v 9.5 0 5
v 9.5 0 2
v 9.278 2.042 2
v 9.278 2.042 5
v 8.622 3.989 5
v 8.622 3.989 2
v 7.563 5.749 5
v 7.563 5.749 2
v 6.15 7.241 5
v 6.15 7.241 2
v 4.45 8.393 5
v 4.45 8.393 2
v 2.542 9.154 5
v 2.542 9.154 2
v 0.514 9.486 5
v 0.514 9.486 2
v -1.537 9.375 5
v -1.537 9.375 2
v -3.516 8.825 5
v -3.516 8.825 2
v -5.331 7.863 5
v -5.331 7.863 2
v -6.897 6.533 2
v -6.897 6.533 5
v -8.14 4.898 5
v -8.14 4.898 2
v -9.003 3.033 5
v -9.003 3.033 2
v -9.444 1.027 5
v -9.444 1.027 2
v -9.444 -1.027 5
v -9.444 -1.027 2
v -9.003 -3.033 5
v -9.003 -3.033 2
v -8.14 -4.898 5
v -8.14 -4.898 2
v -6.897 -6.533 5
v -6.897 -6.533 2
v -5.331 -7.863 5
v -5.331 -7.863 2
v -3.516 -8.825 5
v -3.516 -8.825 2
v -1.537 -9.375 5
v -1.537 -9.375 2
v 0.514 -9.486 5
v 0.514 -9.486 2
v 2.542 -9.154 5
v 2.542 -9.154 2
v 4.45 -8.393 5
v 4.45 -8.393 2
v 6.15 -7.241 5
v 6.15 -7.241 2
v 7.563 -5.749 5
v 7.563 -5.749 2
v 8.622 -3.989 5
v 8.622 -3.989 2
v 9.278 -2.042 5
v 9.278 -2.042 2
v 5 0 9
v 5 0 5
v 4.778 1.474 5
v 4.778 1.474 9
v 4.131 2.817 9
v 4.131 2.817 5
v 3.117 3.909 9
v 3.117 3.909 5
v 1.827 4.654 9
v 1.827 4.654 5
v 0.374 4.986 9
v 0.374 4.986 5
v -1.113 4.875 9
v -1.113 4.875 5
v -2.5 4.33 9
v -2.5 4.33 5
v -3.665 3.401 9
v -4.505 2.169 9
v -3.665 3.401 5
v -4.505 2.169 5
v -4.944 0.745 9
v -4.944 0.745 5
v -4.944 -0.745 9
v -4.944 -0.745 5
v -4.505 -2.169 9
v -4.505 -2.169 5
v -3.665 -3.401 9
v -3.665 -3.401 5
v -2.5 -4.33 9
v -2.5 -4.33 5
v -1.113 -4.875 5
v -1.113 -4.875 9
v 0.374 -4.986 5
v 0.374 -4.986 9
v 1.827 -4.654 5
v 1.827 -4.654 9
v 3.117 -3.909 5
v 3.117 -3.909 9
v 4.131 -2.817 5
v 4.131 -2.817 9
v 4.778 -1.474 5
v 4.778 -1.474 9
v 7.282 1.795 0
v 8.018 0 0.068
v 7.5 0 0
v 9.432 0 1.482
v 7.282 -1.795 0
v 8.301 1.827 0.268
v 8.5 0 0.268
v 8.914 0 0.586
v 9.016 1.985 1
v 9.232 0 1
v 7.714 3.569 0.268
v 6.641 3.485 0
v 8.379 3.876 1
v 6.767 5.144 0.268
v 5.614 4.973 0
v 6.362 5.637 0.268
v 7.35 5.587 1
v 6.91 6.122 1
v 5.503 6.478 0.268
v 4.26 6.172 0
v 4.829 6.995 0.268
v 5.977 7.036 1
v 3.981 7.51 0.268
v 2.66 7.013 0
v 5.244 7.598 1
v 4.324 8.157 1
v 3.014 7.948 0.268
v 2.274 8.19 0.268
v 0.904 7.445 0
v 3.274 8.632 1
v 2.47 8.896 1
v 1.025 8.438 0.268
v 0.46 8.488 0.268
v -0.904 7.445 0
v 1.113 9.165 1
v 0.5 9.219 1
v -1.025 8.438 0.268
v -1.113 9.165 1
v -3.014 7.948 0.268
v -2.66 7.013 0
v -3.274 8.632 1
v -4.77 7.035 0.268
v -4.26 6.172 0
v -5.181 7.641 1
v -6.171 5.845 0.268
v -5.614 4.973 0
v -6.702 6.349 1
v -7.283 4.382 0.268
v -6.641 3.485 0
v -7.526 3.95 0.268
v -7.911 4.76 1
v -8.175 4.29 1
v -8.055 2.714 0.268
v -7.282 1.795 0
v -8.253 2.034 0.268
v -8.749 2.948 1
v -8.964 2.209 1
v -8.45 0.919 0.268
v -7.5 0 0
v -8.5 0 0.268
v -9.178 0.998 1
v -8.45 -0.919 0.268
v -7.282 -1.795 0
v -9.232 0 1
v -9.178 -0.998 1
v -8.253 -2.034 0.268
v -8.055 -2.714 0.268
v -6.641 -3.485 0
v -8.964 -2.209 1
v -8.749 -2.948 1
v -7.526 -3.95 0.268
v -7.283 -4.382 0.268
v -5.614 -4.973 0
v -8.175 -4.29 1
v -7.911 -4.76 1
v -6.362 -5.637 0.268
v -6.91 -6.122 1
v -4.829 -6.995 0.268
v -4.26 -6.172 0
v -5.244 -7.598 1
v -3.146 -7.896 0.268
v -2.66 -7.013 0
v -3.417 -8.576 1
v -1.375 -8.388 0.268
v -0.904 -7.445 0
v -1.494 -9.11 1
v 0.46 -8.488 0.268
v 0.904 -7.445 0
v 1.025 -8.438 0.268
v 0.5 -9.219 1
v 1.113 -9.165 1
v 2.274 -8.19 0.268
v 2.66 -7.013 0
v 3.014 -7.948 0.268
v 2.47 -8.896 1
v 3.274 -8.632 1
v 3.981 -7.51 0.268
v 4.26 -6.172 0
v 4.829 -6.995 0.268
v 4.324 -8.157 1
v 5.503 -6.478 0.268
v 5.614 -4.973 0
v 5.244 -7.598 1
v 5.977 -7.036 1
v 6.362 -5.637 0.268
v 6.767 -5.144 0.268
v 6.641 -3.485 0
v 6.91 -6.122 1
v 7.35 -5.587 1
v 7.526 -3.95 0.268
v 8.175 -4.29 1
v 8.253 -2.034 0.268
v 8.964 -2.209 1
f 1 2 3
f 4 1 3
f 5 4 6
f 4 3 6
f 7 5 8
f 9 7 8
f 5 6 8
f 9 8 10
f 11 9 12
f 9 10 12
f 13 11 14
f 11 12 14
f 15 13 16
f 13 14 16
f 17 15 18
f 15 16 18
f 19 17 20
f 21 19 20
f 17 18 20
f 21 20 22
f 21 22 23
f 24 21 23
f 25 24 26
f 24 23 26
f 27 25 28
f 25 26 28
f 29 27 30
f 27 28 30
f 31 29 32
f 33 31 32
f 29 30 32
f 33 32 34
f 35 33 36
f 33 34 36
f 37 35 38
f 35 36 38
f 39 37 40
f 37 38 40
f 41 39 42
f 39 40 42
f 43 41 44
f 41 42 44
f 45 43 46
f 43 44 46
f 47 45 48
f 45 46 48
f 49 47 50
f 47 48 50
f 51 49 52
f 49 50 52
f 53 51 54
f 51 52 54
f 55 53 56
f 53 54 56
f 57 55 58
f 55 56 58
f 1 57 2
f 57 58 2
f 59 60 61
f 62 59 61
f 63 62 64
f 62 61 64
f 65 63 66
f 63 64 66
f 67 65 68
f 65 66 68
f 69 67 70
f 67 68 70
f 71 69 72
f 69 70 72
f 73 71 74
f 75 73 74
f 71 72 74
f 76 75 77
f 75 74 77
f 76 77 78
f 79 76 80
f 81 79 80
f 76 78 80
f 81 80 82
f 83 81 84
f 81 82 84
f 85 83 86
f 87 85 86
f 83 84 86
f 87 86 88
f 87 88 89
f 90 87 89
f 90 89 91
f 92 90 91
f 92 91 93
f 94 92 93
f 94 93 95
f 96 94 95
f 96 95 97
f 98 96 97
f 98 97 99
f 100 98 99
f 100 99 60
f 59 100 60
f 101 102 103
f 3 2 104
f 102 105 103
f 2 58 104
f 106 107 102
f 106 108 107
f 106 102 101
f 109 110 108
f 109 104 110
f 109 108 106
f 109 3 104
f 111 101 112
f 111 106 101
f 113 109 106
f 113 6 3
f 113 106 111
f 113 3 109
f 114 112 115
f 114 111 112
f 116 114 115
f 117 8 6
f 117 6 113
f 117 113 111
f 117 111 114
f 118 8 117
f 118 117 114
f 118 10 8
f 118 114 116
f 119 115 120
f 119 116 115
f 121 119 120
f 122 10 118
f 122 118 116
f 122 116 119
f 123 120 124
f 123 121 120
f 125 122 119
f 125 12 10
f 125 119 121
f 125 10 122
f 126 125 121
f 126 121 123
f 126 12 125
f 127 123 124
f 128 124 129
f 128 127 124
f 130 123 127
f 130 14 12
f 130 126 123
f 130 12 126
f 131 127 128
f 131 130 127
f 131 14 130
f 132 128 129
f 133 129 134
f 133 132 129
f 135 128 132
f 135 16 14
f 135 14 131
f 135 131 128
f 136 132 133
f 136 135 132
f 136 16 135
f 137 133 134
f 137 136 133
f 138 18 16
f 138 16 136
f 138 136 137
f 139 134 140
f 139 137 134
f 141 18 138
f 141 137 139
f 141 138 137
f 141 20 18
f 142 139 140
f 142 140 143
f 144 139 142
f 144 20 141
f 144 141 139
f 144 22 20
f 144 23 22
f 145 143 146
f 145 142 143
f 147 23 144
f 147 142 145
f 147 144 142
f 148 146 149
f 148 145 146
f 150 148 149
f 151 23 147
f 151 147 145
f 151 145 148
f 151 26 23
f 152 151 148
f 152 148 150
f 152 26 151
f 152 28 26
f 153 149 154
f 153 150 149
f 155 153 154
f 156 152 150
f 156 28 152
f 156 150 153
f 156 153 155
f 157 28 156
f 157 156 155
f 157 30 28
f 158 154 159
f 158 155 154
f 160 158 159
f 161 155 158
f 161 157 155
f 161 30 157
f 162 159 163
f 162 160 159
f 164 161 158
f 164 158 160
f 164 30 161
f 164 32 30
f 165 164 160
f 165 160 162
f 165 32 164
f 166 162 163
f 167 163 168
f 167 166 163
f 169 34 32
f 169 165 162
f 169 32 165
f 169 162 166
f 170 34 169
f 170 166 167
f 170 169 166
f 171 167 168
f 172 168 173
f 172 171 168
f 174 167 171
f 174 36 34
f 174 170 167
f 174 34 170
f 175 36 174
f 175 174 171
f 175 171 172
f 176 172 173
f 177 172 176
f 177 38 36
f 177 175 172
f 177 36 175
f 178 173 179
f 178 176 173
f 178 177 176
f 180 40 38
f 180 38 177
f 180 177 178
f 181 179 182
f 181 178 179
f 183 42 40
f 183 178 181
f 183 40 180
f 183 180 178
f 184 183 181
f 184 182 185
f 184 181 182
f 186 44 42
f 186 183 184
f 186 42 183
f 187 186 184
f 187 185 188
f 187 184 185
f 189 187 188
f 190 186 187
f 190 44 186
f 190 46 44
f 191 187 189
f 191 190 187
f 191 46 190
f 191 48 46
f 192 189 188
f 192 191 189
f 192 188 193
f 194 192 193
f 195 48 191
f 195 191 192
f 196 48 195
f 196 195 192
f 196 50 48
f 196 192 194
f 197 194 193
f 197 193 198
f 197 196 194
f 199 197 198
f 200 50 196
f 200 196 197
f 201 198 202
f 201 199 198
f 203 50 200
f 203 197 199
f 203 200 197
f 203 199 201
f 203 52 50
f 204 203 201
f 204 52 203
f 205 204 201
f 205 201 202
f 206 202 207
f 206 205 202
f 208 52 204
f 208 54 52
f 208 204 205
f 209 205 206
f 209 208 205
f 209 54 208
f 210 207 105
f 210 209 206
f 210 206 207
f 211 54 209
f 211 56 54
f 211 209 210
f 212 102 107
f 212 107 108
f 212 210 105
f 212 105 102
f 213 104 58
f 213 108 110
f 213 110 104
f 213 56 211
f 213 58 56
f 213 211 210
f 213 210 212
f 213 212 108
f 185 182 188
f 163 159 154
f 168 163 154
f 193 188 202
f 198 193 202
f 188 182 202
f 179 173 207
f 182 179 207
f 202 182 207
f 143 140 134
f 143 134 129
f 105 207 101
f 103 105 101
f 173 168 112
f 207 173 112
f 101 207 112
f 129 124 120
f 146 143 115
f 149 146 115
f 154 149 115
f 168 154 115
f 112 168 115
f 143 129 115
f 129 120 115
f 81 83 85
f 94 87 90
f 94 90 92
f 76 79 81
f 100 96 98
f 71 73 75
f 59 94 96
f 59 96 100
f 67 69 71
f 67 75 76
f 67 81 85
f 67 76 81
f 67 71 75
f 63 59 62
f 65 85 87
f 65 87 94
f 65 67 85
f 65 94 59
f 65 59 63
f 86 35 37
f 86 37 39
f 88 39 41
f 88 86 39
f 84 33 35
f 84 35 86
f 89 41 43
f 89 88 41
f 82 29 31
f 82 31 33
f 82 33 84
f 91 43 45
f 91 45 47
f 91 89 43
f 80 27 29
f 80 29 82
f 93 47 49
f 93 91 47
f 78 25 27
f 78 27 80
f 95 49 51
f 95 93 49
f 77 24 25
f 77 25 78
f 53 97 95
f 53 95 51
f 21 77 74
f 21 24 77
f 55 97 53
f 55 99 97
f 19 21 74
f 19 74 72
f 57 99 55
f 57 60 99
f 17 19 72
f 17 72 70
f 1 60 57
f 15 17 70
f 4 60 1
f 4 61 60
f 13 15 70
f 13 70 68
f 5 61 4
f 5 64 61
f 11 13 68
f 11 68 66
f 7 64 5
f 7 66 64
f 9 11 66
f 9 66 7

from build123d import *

# Parameters (mm, degrees)
F0_R     = 9.5
F1_DEPTH = 5
F2_R     = 5
F3_DEPTH = 9
F4_R     = 2


with BuildPart() as f1:
    # F0 (on Top) → F1 (new body)
    with BuildSketch(Plane.XY):
        Circle(F0_R)
    extrude(amount=F1_DEPTH)

    # F2 (on Top) → F3 (join)
    with BuildSketch(Plane.XY):
        Circle(F2_R)
    extrude(amount=F3_DEPTH)

    # F4
    f4_edges = [f1.edges().sort_by_distance(p)[0] for p in [
        (-9.5, 0, 0),
    ]]
    fillet(f4_edges, radius=F4_R)


solid = f1.part
